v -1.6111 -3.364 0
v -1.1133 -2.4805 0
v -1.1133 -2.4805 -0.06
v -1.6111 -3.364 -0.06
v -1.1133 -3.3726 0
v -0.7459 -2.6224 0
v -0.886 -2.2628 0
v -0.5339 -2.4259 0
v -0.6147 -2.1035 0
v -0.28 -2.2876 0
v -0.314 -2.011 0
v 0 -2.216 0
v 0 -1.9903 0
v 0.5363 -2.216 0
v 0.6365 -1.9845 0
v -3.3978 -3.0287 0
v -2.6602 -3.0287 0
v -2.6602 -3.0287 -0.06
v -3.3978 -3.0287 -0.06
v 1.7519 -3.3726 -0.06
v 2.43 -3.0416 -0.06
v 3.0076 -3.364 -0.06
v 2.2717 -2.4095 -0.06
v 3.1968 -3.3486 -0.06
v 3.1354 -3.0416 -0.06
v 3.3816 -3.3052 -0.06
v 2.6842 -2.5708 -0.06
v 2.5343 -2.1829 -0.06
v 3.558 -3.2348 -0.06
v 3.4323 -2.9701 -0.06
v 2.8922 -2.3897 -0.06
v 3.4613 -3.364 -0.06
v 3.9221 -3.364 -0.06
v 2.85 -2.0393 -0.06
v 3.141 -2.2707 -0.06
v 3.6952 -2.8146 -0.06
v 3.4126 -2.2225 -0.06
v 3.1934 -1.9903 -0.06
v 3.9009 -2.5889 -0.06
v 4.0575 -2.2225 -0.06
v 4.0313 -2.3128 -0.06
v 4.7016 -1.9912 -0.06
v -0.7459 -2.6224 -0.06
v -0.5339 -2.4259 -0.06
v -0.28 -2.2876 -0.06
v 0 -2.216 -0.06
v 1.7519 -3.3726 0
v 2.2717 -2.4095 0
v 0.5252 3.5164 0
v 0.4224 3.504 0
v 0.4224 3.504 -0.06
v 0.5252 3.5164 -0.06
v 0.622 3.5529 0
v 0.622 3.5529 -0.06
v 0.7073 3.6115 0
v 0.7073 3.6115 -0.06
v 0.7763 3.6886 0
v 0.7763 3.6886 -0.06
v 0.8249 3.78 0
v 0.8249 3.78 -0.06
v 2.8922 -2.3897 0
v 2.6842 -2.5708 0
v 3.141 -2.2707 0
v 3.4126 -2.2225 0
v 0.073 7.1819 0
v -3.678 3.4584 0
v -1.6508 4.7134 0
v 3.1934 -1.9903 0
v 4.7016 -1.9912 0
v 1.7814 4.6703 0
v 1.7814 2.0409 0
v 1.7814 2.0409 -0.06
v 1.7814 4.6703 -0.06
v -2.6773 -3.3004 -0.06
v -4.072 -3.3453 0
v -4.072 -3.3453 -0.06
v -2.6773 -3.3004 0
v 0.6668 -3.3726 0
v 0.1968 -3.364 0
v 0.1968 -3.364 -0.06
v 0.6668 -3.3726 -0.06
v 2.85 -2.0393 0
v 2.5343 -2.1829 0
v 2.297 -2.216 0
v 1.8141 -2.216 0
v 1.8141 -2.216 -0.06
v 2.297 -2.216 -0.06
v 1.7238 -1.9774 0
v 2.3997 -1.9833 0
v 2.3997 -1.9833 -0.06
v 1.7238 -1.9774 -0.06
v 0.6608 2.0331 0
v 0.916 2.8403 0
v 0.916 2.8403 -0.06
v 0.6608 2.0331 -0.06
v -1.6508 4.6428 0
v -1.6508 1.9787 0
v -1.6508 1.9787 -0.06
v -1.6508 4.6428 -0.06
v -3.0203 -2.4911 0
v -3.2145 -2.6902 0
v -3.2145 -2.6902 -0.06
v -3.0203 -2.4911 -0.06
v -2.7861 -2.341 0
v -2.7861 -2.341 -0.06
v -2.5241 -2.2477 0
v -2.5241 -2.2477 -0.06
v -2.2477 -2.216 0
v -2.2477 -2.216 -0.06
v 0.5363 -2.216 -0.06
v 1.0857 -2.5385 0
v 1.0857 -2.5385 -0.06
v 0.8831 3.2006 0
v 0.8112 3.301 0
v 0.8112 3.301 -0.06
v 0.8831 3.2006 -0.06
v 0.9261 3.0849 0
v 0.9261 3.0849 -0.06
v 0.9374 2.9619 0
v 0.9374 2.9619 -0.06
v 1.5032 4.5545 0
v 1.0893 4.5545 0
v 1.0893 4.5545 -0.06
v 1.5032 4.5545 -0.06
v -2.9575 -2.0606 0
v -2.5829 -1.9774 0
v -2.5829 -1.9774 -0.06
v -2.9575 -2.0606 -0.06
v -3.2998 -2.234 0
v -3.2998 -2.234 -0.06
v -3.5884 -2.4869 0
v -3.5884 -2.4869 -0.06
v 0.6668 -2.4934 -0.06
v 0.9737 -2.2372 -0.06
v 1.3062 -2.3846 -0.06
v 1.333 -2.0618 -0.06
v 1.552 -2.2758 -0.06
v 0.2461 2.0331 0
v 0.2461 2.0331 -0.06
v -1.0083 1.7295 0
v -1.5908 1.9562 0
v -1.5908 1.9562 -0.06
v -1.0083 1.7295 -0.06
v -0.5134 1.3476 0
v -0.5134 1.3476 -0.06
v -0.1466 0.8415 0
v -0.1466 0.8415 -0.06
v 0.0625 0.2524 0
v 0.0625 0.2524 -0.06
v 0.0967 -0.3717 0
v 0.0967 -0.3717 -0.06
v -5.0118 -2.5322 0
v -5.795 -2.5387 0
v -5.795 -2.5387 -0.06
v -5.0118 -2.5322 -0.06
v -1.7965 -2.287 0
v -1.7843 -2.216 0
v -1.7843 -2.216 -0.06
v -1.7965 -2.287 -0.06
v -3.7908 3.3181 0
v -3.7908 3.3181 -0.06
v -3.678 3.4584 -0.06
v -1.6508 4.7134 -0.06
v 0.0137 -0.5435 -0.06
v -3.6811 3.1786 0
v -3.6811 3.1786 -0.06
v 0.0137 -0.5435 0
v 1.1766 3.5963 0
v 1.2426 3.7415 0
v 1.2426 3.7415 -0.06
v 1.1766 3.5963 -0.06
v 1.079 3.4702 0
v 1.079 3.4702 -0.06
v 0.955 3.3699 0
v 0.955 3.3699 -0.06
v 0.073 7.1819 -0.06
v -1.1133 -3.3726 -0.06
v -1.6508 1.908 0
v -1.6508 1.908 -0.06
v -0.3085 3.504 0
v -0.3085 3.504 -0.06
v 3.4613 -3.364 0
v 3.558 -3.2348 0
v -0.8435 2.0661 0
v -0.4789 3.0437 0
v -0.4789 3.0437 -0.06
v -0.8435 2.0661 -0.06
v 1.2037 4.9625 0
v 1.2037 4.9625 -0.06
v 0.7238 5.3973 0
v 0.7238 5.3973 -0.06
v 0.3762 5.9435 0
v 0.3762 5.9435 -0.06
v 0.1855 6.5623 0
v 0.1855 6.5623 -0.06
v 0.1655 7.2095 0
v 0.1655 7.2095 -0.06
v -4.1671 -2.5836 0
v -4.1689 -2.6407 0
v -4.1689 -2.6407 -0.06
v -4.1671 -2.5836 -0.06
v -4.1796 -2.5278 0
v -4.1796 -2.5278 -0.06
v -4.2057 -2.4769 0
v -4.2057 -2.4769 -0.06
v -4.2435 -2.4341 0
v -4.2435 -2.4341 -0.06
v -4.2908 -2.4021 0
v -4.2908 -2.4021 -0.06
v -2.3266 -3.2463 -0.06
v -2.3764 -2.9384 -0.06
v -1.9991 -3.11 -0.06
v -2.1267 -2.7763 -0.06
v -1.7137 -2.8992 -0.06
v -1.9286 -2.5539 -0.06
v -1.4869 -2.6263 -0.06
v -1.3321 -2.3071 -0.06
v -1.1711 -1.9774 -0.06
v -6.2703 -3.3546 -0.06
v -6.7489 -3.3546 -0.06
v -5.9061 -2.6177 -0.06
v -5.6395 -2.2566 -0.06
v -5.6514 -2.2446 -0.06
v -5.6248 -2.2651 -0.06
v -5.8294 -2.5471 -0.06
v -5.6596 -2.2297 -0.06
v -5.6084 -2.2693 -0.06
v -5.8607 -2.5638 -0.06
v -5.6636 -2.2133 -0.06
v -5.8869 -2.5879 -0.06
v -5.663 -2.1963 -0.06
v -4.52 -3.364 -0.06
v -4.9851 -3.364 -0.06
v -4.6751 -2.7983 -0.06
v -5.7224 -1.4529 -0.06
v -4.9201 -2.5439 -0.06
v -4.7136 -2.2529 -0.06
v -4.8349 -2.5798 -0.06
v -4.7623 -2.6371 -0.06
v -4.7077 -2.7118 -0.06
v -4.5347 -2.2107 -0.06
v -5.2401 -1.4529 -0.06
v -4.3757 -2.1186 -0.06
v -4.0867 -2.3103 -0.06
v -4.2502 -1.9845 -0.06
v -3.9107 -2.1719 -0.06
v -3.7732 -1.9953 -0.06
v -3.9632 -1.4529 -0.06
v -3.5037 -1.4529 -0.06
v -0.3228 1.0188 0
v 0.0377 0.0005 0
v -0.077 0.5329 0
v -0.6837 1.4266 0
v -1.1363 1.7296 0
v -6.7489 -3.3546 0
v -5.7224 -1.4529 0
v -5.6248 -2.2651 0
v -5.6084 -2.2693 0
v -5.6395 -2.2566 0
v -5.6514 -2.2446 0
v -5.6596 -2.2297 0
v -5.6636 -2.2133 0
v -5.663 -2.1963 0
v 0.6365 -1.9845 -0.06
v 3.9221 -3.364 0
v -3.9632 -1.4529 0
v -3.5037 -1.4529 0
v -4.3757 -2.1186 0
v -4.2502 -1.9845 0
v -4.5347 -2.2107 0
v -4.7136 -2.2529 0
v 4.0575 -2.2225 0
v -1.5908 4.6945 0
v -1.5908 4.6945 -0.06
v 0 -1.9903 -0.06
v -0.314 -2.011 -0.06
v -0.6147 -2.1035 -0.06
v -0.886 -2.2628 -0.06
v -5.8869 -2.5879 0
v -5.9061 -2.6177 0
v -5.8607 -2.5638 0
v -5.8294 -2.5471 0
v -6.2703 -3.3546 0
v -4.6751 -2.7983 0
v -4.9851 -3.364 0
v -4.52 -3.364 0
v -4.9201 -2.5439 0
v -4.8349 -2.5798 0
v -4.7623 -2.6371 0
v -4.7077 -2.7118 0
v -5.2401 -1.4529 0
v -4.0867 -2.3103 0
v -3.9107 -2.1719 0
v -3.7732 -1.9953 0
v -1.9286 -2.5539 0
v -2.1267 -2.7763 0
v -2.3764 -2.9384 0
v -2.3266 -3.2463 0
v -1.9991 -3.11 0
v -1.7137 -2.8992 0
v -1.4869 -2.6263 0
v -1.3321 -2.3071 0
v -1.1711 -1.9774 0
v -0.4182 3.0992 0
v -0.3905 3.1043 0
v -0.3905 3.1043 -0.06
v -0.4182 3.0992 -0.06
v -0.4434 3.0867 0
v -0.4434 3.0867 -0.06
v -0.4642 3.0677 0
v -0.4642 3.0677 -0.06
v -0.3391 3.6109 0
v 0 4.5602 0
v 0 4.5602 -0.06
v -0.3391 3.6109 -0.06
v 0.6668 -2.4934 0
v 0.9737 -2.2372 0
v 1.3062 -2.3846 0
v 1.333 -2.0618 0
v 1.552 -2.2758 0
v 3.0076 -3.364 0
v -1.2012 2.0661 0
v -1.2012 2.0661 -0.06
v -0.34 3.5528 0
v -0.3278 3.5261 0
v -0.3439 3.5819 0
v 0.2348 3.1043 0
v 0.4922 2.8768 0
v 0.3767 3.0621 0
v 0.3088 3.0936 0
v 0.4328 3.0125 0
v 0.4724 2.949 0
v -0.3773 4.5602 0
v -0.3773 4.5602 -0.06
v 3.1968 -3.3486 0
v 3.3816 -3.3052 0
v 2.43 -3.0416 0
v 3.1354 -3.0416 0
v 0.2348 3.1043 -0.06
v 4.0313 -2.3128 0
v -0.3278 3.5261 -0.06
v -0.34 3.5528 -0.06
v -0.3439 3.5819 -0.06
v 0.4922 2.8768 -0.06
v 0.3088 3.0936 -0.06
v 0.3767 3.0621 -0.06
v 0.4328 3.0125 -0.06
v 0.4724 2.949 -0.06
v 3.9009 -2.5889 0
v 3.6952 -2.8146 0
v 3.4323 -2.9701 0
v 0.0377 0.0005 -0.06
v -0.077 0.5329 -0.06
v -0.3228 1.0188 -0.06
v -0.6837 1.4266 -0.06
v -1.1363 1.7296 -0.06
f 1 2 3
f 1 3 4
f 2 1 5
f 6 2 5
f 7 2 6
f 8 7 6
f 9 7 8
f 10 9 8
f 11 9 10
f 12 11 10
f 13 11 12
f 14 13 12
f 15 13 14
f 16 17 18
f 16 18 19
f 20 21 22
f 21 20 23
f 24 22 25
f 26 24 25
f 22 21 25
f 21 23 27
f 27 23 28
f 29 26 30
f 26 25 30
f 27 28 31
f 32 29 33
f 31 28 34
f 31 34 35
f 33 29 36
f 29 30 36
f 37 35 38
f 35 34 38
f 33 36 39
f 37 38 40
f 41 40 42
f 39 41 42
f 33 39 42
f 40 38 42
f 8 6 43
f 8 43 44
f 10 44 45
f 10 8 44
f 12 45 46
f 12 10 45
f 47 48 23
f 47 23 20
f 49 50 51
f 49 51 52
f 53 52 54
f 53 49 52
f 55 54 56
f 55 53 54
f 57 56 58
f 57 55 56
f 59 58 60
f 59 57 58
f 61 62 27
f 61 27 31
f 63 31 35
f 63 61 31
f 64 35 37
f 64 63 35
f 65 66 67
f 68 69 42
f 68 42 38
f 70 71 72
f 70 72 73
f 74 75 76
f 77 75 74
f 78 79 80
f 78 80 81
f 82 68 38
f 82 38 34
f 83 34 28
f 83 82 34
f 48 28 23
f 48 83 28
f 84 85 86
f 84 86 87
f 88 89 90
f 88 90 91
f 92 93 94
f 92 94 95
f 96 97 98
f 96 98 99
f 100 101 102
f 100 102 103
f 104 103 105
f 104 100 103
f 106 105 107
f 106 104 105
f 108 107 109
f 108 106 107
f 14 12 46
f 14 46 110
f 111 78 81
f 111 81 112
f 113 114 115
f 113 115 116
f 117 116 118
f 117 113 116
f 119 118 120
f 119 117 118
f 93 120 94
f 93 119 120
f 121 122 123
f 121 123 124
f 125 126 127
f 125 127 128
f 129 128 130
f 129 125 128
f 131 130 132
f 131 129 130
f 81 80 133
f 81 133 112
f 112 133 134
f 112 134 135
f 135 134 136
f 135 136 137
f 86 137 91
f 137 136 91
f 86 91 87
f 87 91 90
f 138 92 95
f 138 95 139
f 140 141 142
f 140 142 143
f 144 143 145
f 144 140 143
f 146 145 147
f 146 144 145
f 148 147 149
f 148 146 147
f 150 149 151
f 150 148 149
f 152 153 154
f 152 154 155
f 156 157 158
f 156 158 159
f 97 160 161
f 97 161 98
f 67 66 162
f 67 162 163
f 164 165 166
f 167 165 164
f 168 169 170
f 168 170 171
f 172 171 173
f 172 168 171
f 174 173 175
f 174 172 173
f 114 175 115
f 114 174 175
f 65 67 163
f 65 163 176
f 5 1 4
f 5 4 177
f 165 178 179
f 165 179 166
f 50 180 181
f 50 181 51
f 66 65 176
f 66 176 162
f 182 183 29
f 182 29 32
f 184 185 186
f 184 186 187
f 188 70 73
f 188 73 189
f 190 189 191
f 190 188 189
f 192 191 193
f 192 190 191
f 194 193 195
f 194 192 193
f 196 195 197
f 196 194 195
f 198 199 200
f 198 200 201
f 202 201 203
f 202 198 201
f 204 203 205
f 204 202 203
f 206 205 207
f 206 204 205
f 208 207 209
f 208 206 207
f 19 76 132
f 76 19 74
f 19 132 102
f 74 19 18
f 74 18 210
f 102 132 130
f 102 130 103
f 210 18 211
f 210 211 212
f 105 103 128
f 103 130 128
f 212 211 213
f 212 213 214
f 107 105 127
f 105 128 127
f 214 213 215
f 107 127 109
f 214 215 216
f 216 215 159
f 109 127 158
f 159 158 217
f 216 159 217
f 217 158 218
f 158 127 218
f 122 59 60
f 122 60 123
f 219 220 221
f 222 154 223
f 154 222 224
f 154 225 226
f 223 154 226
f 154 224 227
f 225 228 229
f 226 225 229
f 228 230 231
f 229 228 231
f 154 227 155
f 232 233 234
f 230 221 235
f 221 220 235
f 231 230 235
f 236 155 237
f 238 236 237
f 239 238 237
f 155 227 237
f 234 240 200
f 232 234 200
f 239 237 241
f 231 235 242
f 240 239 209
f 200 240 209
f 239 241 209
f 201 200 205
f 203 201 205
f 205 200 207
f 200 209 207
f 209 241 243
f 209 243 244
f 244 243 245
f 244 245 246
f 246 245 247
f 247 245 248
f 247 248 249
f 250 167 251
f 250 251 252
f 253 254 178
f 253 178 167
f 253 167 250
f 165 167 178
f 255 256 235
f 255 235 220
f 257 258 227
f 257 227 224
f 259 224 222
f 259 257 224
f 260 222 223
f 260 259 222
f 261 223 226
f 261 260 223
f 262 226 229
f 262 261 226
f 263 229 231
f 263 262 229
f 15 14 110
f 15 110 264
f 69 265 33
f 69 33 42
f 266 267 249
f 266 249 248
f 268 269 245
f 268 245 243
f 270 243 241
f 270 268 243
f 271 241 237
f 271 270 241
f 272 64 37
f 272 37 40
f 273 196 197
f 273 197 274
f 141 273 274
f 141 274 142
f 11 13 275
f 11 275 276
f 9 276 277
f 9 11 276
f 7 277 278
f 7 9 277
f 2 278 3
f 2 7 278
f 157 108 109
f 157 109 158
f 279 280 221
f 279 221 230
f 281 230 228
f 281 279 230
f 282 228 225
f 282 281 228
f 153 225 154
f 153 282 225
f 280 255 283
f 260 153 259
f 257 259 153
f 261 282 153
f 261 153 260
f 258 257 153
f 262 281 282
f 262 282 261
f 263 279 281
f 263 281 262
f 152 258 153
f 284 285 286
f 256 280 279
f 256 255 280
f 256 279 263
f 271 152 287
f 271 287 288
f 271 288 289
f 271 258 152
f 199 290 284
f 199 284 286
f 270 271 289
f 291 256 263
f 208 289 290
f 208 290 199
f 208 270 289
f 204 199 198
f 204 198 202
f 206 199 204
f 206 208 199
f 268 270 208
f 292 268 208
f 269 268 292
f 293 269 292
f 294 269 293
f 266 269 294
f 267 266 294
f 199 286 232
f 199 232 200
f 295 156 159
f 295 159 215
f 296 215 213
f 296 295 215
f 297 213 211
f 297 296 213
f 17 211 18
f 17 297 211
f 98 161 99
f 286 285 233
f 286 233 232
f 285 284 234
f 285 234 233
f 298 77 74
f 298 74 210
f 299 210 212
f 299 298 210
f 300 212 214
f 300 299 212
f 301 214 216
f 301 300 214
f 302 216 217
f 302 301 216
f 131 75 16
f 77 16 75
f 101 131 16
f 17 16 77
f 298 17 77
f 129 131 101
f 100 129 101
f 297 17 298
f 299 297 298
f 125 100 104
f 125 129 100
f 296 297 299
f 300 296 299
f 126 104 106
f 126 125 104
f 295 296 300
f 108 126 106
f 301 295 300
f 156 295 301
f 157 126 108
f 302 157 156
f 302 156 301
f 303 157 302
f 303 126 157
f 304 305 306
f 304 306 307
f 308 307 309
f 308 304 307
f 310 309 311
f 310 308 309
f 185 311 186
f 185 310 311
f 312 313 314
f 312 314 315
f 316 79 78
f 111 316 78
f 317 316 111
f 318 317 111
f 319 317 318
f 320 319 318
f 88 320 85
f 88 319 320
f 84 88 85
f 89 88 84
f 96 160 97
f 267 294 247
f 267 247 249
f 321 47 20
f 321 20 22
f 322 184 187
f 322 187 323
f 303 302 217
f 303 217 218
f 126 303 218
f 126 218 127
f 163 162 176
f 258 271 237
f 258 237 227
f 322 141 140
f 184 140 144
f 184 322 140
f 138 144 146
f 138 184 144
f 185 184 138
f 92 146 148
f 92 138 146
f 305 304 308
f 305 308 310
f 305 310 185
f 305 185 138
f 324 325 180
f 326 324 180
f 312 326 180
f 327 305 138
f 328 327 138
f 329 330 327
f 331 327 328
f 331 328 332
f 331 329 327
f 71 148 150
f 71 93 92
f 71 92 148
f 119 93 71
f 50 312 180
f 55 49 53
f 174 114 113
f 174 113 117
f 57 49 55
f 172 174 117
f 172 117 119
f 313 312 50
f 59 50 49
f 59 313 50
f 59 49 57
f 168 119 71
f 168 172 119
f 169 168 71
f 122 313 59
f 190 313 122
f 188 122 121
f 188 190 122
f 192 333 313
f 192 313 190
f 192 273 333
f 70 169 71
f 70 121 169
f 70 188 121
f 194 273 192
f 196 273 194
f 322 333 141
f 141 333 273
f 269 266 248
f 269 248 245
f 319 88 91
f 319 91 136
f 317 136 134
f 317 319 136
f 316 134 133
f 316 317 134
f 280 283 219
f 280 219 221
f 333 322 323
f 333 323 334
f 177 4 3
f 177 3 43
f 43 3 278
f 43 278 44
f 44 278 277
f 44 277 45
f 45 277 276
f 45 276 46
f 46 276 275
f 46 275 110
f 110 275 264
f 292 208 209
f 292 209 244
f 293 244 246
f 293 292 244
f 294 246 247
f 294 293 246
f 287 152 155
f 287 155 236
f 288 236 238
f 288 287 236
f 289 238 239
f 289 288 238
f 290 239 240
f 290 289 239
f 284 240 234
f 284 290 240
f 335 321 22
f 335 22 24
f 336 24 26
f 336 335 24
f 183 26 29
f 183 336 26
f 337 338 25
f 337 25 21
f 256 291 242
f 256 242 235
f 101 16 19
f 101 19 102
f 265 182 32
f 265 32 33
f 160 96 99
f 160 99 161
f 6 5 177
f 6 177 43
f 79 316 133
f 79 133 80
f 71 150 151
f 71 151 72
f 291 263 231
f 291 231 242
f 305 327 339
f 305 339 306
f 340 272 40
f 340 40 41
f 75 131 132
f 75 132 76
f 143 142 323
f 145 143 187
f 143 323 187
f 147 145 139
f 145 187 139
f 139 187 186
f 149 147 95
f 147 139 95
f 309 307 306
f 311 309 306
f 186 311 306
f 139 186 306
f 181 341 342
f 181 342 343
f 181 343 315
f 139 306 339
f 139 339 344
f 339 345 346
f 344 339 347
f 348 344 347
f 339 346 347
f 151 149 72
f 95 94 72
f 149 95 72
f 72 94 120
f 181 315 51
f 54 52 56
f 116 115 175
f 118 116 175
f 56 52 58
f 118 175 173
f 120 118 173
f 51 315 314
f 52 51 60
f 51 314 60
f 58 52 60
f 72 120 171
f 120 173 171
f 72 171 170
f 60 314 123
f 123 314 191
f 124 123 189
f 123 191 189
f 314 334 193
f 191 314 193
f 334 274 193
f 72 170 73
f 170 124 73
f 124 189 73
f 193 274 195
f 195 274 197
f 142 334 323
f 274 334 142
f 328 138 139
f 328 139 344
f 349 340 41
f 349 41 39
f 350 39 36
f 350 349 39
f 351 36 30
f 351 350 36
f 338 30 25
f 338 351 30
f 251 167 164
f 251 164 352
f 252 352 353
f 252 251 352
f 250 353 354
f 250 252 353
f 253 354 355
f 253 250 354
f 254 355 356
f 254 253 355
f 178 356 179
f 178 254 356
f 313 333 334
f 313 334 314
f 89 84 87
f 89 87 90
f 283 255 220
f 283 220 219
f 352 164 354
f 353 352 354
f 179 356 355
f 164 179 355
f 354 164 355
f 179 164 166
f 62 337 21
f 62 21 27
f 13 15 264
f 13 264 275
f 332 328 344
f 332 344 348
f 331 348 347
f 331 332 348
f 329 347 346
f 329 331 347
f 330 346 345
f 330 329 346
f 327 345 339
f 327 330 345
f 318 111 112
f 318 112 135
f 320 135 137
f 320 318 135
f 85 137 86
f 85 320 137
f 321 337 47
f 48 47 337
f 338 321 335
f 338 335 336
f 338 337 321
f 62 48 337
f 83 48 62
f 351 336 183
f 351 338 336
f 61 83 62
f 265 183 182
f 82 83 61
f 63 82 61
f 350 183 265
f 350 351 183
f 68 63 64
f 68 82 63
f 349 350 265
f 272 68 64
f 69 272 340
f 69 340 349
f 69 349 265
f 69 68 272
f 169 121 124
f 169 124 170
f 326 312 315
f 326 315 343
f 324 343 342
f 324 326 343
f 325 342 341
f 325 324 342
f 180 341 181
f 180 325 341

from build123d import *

# Parameters (mm, degrees)
F1_DEPTH = 0.2
F2_SCALE = 0.3


with BuildPart() as f1:
    # F0 (on Top) → F1 (new body)
    with BuildSketch(Plane.XY):
        with BuildLine():
            Line((0.3221887287, -1.2390491494), (5.9381237452, 6.8029700547))
            Line((5.9381237452, 6.8029700547), (5.9381237452, 15.5676616906))
            ThreePointArc((5.9381237452, 15.5676616906), (1.7723507567, 18.8624852196), (0.551509194, 24.0315347027))
            Line((0.551509194, 24.0315347027), (-5.3026779883, 15.6483383863))
            Line((-5.3026779883, 15.6483383863), (-5.3026779883, 6.5205997522))
            ThreePointArc((-5.3026779883, 6.5205997522), (-1.0395342394, 3.6923760496), (0.3221887287, -1.2390491494))
        make_face()
        with BuildLine():
            Line((-4.0039531887, 6.8868417293), (-1.2578062015, 15.2005720884))
            Line((-1.2578062015, 15.2005720884), (0, 15.2005720884))
            Line((0, 15.2005720884), (-1.1304413683, 12.0364315361))
            ThreePointArc((-1.1304413683, 12.0364315361), (-1.1332673696, 11.8427166471), (-1.0282194708, 11.6799334064))
            Line((-1.0282194708, 11.6799334064), (1.4081238769, 11.6799334064))
            ThreePointArc((1.4081238769, 11.6799334064), (2.2214482851, 11.9320780556), (2.7495124377, 12.6000763848))
            Line((2.7495124377, 12.6000763848), (3.6309957504, 15.181590803))
            Line((3.6309957504, 15.181590803), (5.0107096322, 15.181590803))
            Line((5.0107096322, 15.181590803), (4.1420012712, 12.4715473503))
            ThreePointArc((4.1420012712, 12.4715473503), (3.5967677723, 11.5672258478), (2.7040650602, 11.0031701624))
            ThreePointArc((2.7040650602, 11.0031701624), (3.0871173523, 10.2828780548), (3.0534872785, 9.4677591696))
            Line((3.0534872785, 9.4677591696), (2.2027201485, 6.7769880407))
            Line((2.2027201485, 6.7769880407), (0.820223242, 6.7769880407))
            Line((0.820223242, 6.7769880407), (1.6406058567, 9.589375928))
            ThreePointArc((1.6406058567, 9.589375928), (1.3551604564, 10.1310381804), (0.782554911, 10.3478329256))
            Line((0.782554911, 10.3478329256), (-1.3016803423, 10.3478329256))
            ThreePointArc((-1.3016803423, 10.3478329256), (-1.4779448579, 10.2890176936), (-1.5963046791, 10.1457718779))
            Line((-1.5963046791, 10.1457718779), (-2.8115476016, 6.8868417293))
            Line((-2.8115476016, 6.8868417293), (-4.0039531887, 6.8868417293))
        make_face(mode=Mode.SUBTRACT)
    extrude(amount=-F1_DEPTH)


with BuildPart() as f1b:
    # F0 (on Top) → F1, piece 2 (new body)
    with BuildSketch(Plane.XY):
        with BuildLine():
            ThreePointArc((0.0455915557, -1.8117811989), (-1.0759408053, 3.3961031617), (-5.5026779883, 6.3598663546))
            Line((-5.5026779883, 6.3598663546), (-12.2704175663, 10.5954582346))
            Line((-12.2704175663, 10.5954582346), (0.0455915557, -1.8117811989))
        make_face()
    extrude(amount=-F1_DEPTH)


with BuildPart() as f1c:
    # F0 (on Top) → F1, piece 3 (new body)
    with BuildSketch(Plane.XY):
        Polygon((-5.5026779883, 6.5958060592), (-5.5026779883, 15.4760383667), (-12.635980278, 11.0601854738), align=None)
    extrude(amount=-F1_DEPTH)


with BuildPart() as f1d:
    # F0 (on Top) → F1, piece 4 (new body)
    with BuildSketch(Plane.XY):
        Polygon((-12.2601570899, 11.528058606), (-5.5026779883, 15.7112590969), (0.2434776577, 23.9397542483), align=None)
    extrude(amount=-F1_DEPTH)


with BuildPart() as f1e:
    # F0 (on Top) → F1, piece 5 (new body)
    with BuildSketch(Plane.XY):
        with BuildLine():
            Line((15.6719795434, -6.6372910397), (10.644714348, -6.6343117505))
            ThreePointArc((10.644714348, -6.6343117505), (8.956874135, -6.9996048306), (7.5723426417, -8.0317463726))
            Line((7.5723426417, -8.0317463726), (5.8395114478, -11.2419195165))
            Line((5.8395114478, -11.2419195165), (10.0254435092, -11.213440448))
            ThreePointArc((10.0254435092, -11.213440448), (10.9668398403, -11.1011779704), (11.8598518893, -10.7828080654))
            Line((11.8598518893, -10.7828080654), (11.5375751629, -11.213440448))
            Line((11.5375751629, -11.213440448), (13.0737610161, -11.213440448))
            Line((13.0737610161, -11.213440448), (15.6719795434, -6.6372910397))
        make_face()
        with BuildLine():
            ThreePointArc((8.9473901317, -8.5692228749), (10.0420664485, -7.7394049699), (11.3752083853, -7.4082757346))
            Line((11.3752083853, -7.4082757346), (13.5249486193, -7.4082757346))
            Line((13.5249486193, -7.4082757346), (13.4377796203, -7.7092619613))
            ThreePointArc((13.4377796203, -7.7092619613), (12.3172915564, -9.3821473425), (10.4513484985, -10.1386494935))
            Line((10.4513484985, -10.1386494935), (8.0999564379, -10.1386494935))
            Line((8.0999564379, -10.1386494935), (8.9473901317, -8.5692228749))
        make_face(mode=Mode.SUBTRACT)
    extrude(amount=-F1_DEPTH)


with BuildPart() as f1f:
    # F0 (on Top) → F1, piece 6 (new body)
    with BuildSketch(Plane.XY):
        with BuildLine():
            Line((7.9989461764, -6.6110268672), (5.7461061515, -6.5913153812))
            ThreePointArc((5.7461061515, -6.5913153812), (3.8269548312, -7.1288721816), (2.2225470748, -8.3112362772))
            Line((2.2225470748, -8.3112362772), (0.6559555881, -11.213440448))
            Line((0.6559555881, -11.213440448), (2.2225470748, -11.2419195165))
            Line((2.2225470748, -11.2419195165), (3.6190801766, -8.4617296234))
            ThreePointArc((3.6190801766, -8.4617296234), (4.7548095867, -7.7476826092), (6.0468981974, -7.386778947))
            Line((6.0468981974, -7.386778947), (7.6567602687, -7.3867780156))
            Line((7.6567602687, -7.3867780156), (7.9989461764, -6.6110268672))
        make_face()
    extrude(amount=-F1_DEPTH)


with BuildPart() as f1g:
    # F0 (on Top) → F1, piece 7 (new body)
    with BuildSketch(Plane.XY):
        with BuildLine():
            ThreePointArc((-2.486287849, -8.7412158027), (-1.3708885374, -7.8295011783), (0, -7.3867780156))
            Line((0, -7.3867780156), (1.7875585472, -7.3867780156))
            Line((1.7875585472, -7.3867780156), (2.1217935719, -6.6148531623))
            Line((2.1217935719, -6.6148531623), (0, -6.6343126819))
            ThreePointArc((0, -6.6343126819), (-2.0490469004, -7.011625802), (-3.7109393161, -8.268237114))
            Line((-3.7109393161, -8.268237114), (-5.3702842035, -11.213440448))
            Line((-5.3702842035, -11.213440448), (-3.7109393161, -11.2419195165))
            Line((-3.7109393161, -11.2419195165), (-2.486287849, -8.7412158027))
        make_face()
    extrude(amount=-F1_DEPTH)


with BuildPart() as f1h:
    # F0 (on Top) → F1, piece 8 (new body)
    with BuildSketch(Plane.XY):
        with BuildLine():
            Line((-3.9036741946, -6.5913149156), (-8.6095463485, -6.5913149156))
            ThreePointArc((-8.6095463485, -6.5913149156), (-10.4468670481, -7.12185676), (-11.9612244889, -8.2897366956))
            Line((-11.9612244889, -8.2897366956), (-13.5733263679, -11.1510875002))
            Line((-13.5733263679, -11.1510875002), (-8.9242989197, -11.0012982041))
            ThreePointArc((-8.9242989197, -11.0012982041), (-6.1667191094, -10.0440713662), (-4.4402293861, -7.6904012822))
            Line((-4.4402293861, -7.6904012822), (-3.9036741946, -6.5913149156))
        make_face()
        with BuildLine():
            ThreePointArc((-5.9883617796, -7.6232668944), (-7.0888461772, -9.2542353693), (-8.8673681021, -10.0956531242))
            Line((-8.8673681021, -10.0956531242), (-11.3260233775, -10.0956531242))
            Line((-11.3260233775, -10.0956531242), (-10.7150869444, -8.9674610645))
            ThreePointArc((-10.7150869444, -8.9674610645), (-9.2870890069, -7.8032245883), (-7.4923196808, -7.3867780156))
            Line((-7.4923196808, -7.3867780156), (-5.9476941824, -7.3867780156))
            Line((-5.9476941824, -7.3867780156), (-5.9883617796, -7.6232668944))
        make_face(mode=Mode.SUBTRACT)
    extrude(amount=-F1_DEPTH)


with BuildPart() as f1i:
    # F0 (on Top) → F1, piece 9 (new body)
    with BuildSketch(Plane.XY):
        with BuildLine():
            ThreePointArc((-14.1671802849, -6.6148531623), (-14.8395201872, -7.2349347814), (-15.7118886709, -7.5097354129))
            Line((-15.7118886709, -7.5097354129), (-18.6945162714, -7.5642843731))
            ThreePointArc((-18.6945162714, -7.5642843731), (-18.8379589434, -7.4818591939), (-18.8768226653, -7.3210508563))
            Line((-18.8768226653, -7.3210508563), (-17.4670927227, -4.8431316391))
            Line((-17.4670927227, -4.8431316391), (-19.0745219588, -4.8431316391))
            Line((-19.0745219588, -4.8431316391), (-22.49625884, -11.1821033061))
            Line((-22.49625884, -11.1821033061), (-20.9010709077, -11.1821033061))
            Line((-20.9010709077, -11.1821033061), (-19.6871310472, -8.7255975232))
            ThreePointArc((-19.6871310472, -8.7255975232), (-19.5357739882, -8.5461370978), (-19.3165130913, -8.4622344002))
            Line((-19.3165130913, -8.4622344002), (-16.7060699314, -8.4407348186))
            ThreePointArc((-16.7060699314, -8.4407348186), (-15.9887854149, -8.68665027), (-15.5837750062, -9.3276947737))
            Line((-15.5837750062, -9.3276947737), (-16.6168492287, -11.213440448))
            Line((-16.6168492287, -11.213440448), (-15.066714026, -11.213440448))
            Line((-15.066714026, -11.213440448), (-13.8961784542, -8.8023440912))
            ThreePointArc((-13.8961784542, -8.8023440912), (-13.9701576636, -8.3385560844), (-14.3026812002, -8.0068930984))
            ThreePointArc((-14.3026812002, -8.0068930984), (-13.3148360087, -7.4882155641), (-12.5773055479, -6.6510098986))
            Line((-12.5773055479, -6.6510098986), (-11.6788372397, -4.8431316391))
            Line((-11.6788372397, -4.8431316391), (-13.2108161934, -4.8431316391))
            Line((-13.2108161934, -4.8431316391), (-14.1671802849, -6.6148531623))
        make_face()
    extrude(amount=-F1_DEPTH)


with BuildPart() as f1b_1:
    # F2: moved
    add(f1b.part.scale(F2_SCALE))


with BuildPart() as f1i_1:
    # F2: moved
    add(f1i.part.scale(F2_SCALE))


with BuildPart() as f1h_1:
    # F2: moved
    add(f1h.part.scale(F2_SCALE))


with BuildPart() as f1g_1:
    # F2: moved
    add(f1g.part.scale(F2_SCALE))


with BuildPart() as f1c_1:
    # F2: moved
    add(f1c.part.scale(F2_SCALE))


with BuildPart() as f1d_1:
    # F2: moved
    add(f1d.part.scale(F2_SCALE))


with BuildPart() as f1_1:
    # F2: moved
    add(f1.part.scale(F2_SCALE))


with BuildPart() as f1f_1:
    # F2: moved
    add(f1f.part.scale(F2_SCALE))


with BuildPart() as f1e_1:
    # F2: moved
    add(f1e.part.scale(F2_SCALE))


solid = Compound([f1b_1.part, f1i_1.part, f1h_1.part, f1g_1.part, f1c_1.part, f1d_1.part, f1_1.part, f1f_1.part, f1e_1.part])
